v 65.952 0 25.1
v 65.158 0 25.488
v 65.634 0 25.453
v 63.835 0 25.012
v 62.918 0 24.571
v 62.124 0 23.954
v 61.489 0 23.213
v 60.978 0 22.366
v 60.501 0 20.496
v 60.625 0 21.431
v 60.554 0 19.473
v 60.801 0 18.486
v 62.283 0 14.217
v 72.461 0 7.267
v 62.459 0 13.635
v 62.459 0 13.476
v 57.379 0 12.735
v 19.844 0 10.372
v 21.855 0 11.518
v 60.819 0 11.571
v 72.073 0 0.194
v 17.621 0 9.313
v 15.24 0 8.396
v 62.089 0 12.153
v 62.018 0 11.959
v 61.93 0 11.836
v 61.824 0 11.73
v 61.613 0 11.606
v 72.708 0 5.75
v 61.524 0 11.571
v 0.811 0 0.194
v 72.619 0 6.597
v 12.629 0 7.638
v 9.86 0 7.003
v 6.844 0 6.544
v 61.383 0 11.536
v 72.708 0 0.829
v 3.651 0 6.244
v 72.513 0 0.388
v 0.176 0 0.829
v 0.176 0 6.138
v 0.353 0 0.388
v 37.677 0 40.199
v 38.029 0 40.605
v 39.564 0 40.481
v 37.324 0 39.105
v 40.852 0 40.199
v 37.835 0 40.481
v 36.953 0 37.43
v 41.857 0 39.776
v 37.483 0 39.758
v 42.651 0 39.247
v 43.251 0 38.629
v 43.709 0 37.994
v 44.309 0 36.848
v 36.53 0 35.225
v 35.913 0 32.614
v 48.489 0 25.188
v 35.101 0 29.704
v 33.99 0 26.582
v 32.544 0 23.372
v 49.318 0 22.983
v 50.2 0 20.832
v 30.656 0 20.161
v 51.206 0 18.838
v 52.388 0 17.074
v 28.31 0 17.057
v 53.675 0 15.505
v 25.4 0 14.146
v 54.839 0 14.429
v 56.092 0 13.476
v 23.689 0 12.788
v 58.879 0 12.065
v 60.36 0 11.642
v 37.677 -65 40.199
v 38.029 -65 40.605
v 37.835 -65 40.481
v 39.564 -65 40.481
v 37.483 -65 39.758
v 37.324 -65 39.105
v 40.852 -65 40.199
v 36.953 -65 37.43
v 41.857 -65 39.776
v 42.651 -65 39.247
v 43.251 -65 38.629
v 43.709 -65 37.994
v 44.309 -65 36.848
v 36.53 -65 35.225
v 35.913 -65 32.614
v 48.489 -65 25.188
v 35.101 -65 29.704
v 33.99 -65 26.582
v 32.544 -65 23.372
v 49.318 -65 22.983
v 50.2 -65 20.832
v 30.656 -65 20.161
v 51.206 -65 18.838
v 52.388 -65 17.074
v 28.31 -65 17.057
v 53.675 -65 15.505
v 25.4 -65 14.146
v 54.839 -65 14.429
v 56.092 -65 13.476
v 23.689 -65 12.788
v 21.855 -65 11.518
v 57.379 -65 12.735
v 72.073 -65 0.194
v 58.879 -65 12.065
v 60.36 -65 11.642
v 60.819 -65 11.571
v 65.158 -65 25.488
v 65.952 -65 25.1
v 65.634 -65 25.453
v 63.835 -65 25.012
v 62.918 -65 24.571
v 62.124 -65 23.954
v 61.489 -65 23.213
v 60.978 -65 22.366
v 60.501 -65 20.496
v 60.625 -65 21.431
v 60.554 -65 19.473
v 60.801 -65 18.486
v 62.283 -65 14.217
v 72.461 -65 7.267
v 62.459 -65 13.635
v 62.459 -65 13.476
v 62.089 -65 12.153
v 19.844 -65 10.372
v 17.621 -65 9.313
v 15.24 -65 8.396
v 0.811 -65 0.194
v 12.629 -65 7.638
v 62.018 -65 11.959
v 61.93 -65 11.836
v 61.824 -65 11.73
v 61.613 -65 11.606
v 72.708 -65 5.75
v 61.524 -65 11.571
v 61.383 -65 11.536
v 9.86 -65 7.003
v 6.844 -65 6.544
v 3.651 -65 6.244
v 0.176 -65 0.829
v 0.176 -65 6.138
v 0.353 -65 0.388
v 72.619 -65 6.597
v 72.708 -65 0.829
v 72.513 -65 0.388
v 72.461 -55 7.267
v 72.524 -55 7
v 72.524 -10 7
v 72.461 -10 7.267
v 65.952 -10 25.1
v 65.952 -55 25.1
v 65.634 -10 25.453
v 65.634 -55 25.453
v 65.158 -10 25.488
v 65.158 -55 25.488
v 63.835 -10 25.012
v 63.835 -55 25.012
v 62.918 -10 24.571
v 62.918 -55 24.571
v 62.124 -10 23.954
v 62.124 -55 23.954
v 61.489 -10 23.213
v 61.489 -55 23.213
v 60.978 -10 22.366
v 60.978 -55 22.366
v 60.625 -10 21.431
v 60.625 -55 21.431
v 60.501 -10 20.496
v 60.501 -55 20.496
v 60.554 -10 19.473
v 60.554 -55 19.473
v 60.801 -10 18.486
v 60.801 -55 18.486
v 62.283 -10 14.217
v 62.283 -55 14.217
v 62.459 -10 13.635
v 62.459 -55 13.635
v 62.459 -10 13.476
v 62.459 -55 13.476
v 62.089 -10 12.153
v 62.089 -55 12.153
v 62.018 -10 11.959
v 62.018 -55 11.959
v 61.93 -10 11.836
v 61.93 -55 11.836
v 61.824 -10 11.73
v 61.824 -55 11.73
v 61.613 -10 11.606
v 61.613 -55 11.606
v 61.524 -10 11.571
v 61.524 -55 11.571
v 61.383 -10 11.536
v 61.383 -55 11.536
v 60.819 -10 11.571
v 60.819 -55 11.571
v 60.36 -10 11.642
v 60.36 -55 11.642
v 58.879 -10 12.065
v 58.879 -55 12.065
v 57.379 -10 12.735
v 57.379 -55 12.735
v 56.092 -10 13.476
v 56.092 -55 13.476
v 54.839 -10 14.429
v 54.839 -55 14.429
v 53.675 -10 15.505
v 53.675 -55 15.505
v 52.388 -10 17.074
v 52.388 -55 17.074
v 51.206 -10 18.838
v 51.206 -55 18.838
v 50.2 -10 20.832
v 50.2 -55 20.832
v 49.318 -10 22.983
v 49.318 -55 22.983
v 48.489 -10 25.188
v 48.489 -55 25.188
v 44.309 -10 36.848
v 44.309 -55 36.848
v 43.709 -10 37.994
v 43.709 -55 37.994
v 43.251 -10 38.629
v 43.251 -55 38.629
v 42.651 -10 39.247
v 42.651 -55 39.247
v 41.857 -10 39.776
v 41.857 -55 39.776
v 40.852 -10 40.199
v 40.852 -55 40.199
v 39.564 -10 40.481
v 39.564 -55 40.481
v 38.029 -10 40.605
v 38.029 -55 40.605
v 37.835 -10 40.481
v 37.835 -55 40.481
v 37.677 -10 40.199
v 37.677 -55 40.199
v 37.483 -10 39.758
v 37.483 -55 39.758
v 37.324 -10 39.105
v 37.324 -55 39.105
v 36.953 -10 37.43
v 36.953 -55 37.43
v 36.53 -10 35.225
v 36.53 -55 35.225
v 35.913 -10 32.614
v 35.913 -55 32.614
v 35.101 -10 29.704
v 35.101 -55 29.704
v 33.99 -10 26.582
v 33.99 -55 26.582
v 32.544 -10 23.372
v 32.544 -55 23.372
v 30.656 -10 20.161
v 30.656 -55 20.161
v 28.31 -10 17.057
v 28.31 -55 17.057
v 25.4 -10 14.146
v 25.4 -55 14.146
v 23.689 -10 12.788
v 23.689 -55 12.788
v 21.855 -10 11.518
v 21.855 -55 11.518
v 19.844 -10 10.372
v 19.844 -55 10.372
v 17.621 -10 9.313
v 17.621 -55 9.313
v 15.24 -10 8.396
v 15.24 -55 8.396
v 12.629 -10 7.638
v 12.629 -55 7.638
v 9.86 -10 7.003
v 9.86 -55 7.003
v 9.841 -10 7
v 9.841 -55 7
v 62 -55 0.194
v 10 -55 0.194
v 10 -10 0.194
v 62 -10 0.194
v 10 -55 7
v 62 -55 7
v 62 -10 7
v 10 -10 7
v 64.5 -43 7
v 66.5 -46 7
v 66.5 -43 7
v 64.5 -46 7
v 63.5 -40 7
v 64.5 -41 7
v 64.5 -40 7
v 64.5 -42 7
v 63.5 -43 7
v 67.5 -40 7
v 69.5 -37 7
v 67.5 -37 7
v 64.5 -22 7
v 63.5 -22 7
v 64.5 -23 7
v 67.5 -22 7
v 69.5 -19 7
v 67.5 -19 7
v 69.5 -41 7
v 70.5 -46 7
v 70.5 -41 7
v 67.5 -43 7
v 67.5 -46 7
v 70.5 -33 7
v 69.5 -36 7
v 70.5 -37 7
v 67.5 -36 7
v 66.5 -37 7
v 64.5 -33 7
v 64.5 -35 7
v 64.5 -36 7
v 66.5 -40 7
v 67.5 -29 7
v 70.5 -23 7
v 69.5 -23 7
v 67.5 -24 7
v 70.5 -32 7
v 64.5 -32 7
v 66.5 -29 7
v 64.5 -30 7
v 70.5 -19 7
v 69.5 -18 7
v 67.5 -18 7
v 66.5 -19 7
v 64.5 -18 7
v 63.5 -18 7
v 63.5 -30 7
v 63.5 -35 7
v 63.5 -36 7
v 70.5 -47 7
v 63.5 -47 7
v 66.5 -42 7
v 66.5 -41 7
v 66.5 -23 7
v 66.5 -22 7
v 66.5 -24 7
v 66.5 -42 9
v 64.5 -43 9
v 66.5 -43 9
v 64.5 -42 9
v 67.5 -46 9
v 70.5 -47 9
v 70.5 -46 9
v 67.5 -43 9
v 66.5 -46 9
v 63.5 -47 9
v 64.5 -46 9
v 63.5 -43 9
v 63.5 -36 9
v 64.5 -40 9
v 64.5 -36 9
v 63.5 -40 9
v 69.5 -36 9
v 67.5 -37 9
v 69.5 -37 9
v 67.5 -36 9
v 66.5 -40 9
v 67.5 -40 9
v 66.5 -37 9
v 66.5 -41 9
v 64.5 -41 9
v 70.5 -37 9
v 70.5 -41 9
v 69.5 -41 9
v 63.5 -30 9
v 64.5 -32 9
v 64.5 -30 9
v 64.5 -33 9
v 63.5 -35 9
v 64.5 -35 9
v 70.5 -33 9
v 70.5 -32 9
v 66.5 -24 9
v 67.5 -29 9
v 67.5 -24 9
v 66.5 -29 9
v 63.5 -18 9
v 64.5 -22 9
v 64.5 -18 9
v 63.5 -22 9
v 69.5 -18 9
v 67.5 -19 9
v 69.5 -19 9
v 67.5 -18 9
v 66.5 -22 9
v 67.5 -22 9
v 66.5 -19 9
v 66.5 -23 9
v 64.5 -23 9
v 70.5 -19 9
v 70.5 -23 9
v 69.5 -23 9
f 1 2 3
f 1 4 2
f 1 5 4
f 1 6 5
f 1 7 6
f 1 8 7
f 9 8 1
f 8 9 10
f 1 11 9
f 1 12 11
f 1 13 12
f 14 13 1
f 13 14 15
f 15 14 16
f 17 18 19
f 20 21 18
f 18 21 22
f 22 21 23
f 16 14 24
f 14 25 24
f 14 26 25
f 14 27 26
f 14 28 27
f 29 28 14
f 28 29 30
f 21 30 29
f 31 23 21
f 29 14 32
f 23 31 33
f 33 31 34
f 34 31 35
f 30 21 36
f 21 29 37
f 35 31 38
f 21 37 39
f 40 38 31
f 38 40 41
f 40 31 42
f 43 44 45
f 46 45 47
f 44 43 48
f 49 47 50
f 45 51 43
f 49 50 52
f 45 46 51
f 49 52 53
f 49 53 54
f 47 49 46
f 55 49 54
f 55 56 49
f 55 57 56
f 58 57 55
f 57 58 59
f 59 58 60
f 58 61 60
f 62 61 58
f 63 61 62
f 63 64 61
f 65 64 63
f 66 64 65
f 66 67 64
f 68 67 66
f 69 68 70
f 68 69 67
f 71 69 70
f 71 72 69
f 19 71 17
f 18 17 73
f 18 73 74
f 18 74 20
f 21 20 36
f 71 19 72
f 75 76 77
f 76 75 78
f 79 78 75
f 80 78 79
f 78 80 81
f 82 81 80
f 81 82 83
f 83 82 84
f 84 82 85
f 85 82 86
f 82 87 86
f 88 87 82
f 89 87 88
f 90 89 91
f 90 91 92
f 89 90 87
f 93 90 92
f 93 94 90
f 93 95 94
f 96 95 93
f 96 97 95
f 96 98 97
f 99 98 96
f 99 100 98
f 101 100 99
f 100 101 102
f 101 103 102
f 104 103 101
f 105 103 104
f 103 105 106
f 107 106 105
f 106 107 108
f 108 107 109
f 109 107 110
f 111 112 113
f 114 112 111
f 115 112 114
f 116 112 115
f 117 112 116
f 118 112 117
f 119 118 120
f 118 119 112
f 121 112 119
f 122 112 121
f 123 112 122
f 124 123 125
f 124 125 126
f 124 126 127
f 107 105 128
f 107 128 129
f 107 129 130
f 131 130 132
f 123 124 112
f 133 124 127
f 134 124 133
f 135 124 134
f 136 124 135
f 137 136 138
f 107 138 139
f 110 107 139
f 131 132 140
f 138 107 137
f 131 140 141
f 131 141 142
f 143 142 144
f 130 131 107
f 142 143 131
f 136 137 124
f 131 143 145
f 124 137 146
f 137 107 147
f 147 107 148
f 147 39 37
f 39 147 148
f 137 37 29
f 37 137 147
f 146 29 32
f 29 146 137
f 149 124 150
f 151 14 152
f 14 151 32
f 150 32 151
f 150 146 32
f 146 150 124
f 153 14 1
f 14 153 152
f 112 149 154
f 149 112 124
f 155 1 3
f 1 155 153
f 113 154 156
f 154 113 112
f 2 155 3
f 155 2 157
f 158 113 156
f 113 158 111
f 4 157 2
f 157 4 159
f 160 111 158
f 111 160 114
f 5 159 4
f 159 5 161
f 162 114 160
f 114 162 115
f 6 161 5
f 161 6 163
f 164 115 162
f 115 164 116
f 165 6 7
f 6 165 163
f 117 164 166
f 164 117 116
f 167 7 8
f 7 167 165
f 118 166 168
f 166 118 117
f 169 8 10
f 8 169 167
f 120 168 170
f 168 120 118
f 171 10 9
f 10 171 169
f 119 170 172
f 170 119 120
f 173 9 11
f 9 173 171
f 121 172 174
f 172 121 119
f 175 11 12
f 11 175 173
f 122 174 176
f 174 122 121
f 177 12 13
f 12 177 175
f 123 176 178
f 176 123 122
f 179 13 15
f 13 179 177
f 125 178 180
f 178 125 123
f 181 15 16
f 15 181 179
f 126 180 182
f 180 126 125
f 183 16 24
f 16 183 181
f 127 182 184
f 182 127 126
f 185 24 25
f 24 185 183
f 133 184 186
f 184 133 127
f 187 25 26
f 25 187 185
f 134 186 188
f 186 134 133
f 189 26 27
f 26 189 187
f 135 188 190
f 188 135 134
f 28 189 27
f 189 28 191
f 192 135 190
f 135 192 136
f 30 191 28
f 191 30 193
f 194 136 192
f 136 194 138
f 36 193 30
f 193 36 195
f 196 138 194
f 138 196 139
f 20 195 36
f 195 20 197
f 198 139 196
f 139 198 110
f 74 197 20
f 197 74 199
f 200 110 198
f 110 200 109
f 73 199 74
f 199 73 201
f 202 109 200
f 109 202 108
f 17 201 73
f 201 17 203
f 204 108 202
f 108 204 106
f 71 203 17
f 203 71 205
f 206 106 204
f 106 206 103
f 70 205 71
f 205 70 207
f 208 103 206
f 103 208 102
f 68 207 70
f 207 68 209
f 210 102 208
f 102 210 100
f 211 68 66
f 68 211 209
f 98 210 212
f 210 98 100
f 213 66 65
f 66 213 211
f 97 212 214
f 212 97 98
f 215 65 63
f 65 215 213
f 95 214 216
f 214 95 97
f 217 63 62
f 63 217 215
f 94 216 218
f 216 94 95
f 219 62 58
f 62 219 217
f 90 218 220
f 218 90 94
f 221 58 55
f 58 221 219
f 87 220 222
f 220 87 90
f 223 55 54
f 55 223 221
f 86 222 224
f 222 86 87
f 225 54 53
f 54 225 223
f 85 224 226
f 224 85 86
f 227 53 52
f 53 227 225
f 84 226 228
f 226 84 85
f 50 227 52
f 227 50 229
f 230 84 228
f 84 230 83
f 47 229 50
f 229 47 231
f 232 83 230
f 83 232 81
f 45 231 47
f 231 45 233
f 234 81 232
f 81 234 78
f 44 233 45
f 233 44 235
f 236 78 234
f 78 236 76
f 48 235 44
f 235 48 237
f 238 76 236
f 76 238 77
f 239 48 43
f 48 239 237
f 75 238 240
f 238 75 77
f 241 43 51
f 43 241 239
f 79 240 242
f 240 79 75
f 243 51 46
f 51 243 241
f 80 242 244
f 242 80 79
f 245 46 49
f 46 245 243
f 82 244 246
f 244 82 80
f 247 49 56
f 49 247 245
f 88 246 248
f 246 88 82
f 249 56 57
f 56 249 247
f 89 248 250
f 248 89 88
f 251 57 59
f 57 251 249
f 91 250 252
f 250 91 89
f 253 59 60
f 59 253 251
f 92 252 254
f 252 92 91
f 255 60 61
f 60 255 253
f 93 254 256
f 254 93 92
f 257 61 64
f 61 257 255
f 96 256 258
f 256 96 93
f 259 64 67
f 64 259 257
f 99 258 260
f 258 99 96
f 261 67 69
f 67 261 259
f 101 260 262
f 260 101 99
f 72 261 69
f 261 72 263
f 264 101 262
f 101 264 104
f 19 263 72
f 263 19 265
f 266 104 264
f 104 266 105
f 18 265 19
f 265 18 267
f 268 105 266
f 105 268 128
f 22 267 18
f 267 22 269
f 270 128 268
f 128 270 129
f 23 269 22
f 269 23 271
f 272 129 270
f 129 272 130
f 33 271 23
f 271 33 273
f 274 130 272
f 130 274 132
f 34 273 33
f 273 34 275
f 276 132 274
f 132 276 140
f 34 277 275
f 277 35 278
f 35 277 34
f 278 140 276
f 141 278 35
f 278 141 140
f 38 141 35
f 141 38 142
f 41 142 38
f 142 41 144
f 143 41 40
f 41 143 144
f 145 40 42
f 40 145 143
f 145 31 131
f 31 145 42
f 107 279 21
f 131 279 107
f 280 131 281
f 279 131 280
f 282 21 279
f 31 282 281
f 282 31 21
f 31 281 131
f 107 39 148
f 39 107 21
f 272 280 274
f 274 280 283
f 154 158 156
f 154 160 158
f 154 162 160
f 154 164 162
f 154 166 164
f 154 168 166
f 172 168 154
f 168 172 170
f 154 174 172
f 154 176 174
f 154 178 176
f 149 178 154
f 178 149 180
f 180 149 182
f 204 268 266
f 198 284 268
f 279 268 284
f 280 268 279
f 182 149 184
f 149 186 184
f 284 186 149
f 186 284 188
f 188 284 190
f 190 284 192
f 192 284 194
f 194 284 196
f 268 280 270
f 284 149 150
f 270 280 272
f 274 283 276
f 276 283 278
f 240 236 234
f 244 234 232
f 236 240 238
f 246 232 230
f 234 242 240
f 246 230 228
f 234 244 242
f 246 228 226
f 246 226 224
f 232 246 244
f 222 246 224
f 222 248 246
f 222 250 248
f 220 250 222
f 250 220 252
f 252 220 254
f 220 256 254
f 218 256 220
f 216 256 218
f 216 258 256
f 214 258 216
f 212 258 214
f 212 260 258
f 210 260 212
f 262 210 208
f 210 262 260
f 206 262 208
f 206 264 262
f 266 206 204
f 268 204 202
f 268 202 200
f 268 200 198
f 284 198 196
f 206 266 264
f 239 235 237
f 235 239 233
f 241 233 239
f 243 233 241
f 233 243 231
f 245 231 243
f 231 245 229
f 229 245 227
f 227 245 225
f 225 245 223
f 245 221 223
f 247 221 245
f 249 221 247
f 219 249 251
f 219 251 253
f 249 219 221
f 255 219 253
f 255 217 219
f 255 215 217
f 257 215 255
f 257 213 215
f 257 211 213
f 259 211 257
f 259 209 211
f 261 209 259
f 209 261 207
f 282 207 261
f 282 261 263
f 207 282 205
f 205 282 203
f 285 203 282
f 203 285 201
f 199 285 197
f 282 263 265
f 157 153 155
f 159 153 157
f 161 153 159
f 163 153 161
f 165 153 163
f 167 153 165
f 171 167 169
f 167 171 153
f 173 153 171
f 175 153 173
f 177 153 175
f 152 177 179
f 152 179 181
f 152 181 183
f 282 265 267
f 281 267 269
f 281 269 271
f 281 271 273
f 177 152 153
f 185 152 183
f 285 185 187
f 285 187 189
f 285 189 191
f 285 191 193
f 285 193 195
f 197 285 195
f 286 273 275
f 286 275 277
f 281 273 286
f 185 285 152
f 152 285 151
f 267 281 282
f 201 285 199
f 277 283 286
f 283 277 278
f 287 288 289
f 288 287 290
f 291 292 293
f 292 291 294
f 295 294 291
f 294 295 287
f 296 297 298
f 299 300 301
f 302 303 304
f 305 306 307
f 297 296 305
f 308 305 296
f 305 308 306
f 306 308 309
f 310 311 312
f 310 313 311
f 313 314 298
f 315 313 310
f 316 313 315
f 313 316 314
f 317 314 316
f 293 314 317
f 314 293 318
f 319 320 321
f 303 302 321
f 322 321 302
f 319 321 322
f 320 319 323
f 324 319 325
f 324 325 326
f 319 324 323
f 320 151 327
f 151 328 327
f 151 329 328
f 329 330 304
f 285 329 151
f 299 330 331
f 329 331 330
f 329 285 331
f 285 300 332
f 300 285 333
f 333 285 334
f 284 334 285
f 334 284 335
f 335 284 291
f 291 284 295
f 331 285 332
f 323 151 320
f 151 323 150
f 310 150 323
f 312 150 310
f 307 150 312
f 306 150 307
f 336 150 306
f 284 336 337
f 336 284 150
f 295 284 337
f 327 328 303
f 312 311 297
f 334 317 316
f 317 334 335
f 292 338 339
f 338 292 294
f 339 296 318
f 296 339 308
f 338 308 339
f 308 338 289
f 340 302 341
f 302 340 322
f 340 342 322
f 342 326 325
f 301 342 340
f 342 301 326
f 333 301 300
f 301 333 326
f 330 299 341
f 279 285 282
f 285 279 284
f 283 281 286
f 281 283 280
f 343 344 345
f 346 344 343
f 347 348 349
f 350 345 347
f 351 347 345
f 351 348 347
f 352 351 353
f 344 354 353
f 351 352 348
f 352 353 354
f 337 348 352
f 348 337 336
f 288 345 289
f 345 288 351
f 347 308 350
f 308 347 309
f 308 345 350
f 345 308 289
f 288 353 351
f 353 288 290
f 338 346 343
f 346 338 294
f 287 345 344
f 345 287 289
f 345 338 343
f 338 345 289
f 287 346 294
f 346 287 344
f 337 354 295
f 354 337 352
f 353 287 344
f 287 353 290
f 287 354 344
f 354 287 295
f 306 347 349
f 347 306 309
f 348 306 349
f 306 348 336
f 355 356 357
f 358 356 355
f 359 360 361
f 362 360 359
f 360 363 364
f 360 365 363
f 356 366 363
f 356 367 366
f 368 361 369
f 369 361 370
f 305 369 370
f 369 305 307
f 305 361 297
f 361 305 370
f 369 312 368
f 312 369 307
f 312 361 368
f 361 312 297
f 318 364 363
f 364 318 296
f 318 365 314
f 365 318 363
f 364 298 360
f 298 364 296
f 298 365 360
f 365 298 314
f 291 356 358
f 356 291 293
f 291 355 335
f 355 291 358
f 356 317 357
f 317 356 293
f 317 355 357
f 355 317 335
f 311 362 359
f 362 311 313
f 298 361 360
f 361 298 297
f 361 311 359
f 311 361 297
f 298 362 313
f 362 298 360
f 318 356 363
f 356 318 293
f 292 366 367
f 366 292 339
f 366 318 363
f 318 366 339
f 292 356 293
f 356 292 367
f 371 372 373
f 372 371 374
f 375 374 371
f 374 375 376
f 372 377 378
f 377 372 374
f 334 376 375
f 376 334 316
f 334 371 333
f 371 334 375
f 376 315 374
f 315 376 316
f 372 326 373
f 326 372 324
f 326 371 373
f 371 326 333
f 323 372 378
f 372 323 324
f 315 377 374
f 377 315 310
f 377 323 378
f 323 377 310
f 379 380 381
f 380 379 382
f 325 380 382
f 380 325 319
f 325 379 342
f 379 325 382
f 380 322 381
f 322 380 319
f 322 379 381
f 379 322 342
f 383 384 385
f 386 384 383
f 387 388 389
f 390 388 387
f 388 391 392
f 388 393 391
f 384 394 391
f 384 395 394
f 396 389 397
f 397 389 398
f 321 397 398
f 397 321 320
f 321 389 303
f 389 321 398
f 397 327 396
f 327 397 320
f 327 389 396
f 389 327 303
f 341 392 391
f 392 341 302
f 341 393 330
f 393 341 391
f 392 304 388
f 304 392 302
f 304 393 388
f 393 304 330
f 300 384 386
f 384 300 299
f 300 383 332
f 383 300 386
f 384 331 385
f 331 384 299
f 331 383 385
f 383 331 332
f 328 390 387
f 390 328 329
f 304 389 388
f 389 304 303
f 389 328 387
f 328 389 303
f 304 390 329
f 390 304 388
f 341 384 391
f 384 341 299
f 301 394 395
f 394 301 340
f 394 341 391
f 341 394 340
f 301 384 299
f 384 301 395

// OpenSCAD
/* total width of the stand in mm */
total_width = 65;
/* width of each side in mm */
side_width = 10;
/* depth of the cross bars in mm */
bar_depth = 10;

empty_space = total_width - (2*side_width);


rotate([90,0,0])
 difference() {
linear_extrude(file = "phone_stand_pst-s.dxf", height = total_width);
#translate([0,7,side_width]) cube([100,100,empty_space]);
#translate([bar_depth,0,side_width]) cube([72-(2*bar_depth),100,empty_space]);
};

//Draw text
rotate([0,0,90]) translate([-47,-70.5,7]) scale([1,1,2]) drawtext("PST-S");


//Draw character set
//scale([2,2,2]) drawtext(" !\"#$%&'()*+,-./0123456789:;<=>?@ABCDEFGHIJKLMNOPQRSTUVWXYZ[\\]^_`abcdefghijklmnopqrstuvwxyz{|}");

module drawtext(text) {
	//Characters
	chars = " !\"#$%&'()*+,-./0123456789:;<=>?@ABCDEFGHIJKLMNOPQRSTUVWXYZ[\\]^_`abcdefghijklmnopqrstuvwxyz{|}";

	//Chracter table defining 5x7 characters
	//Adapted from: http://www.geocities.com/dinceraydin/djlcdsim/chartable.js
	char_table = [ [ 0, 0, 0, 0, 0, 0, 0],
                  [ 4, 0, 4, 4, 4, 4, 4],
                  [ 0, 0, 0, 0,10,10,10],
                  [10,10,31,10,31,10,10],
                  [ 4,30, 5,14,20,15, 4],
                  [ 3,19, 8, 4, 2,25,24],
                  [13,18,21, 8,20,18,12],
                  [ 0, 0, 0, 0, 8, 4,12],
                  [ 2, 4, 8, 8, 8, 4, 2],
                  [ 8, 4, 2, 2, 2, 4, 8],
                  [ 0, 4,21,14,21, 4, 0],
                  [ 0, 4, 4,31, 4, 4, 0],
                  [ 8, 4,12, 0, 0, 0, 0],
                  [ 0, 0, 0,31, 0, 0, 0],
                  [12,12, 0, 0, 0, 0, 0],
                  [ 0,16, 8, 4, 2, 1, 0],
                  [14,17,25,21,19,17,14],
                  [14, 4, 4, 4, 4,12, 4],
                  [31, 8, 4, 2, 1,17,14],
                  [14,17, 1, 2, 4, 2,31],
                  [ 2, 2,31,18,10, 6, 2],
                  [14,17, 1, 1,30,16,31],
                  [14,17,17,30,16, 8, 6],
                  [ 8, 8, 8, 4, 2, 1,31],
                  [14,17,17,14,17,17,14],
                  [12, 2, 1,15,17,17,14],
                  [ 0,12,12, 0,12,12, 0],
                  [ 8, 4,12, 0,12,12, 0],
                  [ 2, 4, 8,16, 8, 4, 2],
                  [ 0, 0,31, 0,31, 0, 0],
                  [16, 8, 4, 2, 4, 8,16],
                  [ 4, 0, 4, 2, 1,17,14],
                  [14,21,21,13, 1,17,14],
                  [17,17,31,17,17,17,14],
                  [30,17,17,30,17,17,30],
                  [14,17,16,16,16,17,14],
                  [30,17,17,17,17,17,30],
                  [31,16,16,30,16,16,31],
                  [16,16,16,30,16,16,31],
                  [15,17,17,23,16,17,14],
                  [17,17,17,31,17,17,17],
                  [14, 4, 4, 4, 4, 4,14],
                  [12,18, 2, 2, 2, 2, 7],
                  [17,18,20,24,20,18,17],
                  [31,16,16,16,16,16,16],
                  [17,17,17,21,21,27,17],
                  [17,17,19,21,25,17,17],
                  [14,17,17,17,17,17,14],
                  [16,16,16,30,17,17,30],
                  [13,18,21,17,17,17,14],
                  [17,18,20,30,17,17,30],
                  [30, 1, 1,14,16,16,15],
                  [ 4, 4, 4, 4, 4, 4,31],
                  [14,17,17,17,17,17,17],
                  [ 4,10,17,17,17,17,17],
                  [10,21,21,21,17,17,17],
                  [17,17,10, 4,10,17,17],
                  [ 4, 4, 4,10,17,17,17],
                  [31,16, 8, 4, 2, 1,31],
                  [14, 8, 8, 8, 8, 8,14],
                  [ 0, 1, 2, 4, 8,16, 0],
                  [14, 2, 2, 2, 2, 2,14],
                  [ 0, 0, 0, 0,17,10, 4],
                  [31, 0, 0, 0, 0, 0, 0],
                  [ 0, 0, 0, 0, 2, 4, 8],
                  [15,17,15, 1,14, 0, 0],
                  [30,17,17,25,22,16,16],
                  [14,17,16,16,14, 0, 0],
                  [15,17,17,19,13, 1, 1],
                  [14,16,31,17,14, 0, 0],
                  [ 8, 8, 8,28, 8, 9, 6],
                  [14, 1,15,17,15, 0, 0],
                  [17,17,17,25,22,16,16],
                  [14, 4, 4, 4,12, 0, 4],
                  [12,18, 2, 2, 2, 6, 2],
                  [18,20,24,20,18,16,16],
                  [14, 4, 4, 4, 4, 4,12],
                  [17,17,21,21,26, 0, 0],
                  [17,17,17,25,22, 0, 0],
                  [14,17,17,17,14, 0, 0],
                  [16,16,30,17,30, 0, 0],
                  [ 1, 1,15,19,13, 0, 0],
                  [16,16,16,25,22, 0, 0],
                  [30, 1,14,16,15, 0, 0],
                  [ 6, 9, 8, 8,28, 8, 8],
                  [13,19,17,17,17, 0, 0],
                  [ 4,10,17,17,17, 0, 0],
                  [10,21,21,17,17, 0, 0],
                  [17,10, 4,10,17, 0, 0],
                  [14, 1,15,17,17, 0, 0],
                  [31, 8, 4, 2,31, 0, 0],
                  [ 2, 4, 4, 8, 4, 4, 2],
                  [ 4, 4, 4, 4, 4, 4, 4],
                  [ 8, 4, 4, 2, 4, 4, 8] ];

	//Binary decode table
	dec_table = [ "00000", "00001", "00010", "00011", "00100", "00101",
  	            "00110", "00111", "01000", "01001", "01010", "01011",
  	            "01100", "01101", "01110", "01111", "10000", "10001",
  	            "10010", "10011", "10100", "10101", "10110", "10111",
	            "11000", "11001", "11010", "11011", "11100", "11101",
	            "11110", "11111" ];

	//Process string one character at a time
	for(itext = [0:len(text)-1]) {
		//Convert character to index
		assign(ichar = search(text[itext],chars,1)[0]) {
			//Decode character - rows
			for(irow = [0:6]) {
				assign(val = dec_table[char_table[ichar][irow]]) {
					//Decode character - cols
					for(icol = [0:4]) {
						assign(bit = search(val[icol],"01",1)[0]) {
							if(bit) {
								//Output cube
								translate([icol + (6*itext), irow, 0])
									cube([1.0001,1.0001,1]);
							}
						}
					}
				}
			}
		}
	}
}
